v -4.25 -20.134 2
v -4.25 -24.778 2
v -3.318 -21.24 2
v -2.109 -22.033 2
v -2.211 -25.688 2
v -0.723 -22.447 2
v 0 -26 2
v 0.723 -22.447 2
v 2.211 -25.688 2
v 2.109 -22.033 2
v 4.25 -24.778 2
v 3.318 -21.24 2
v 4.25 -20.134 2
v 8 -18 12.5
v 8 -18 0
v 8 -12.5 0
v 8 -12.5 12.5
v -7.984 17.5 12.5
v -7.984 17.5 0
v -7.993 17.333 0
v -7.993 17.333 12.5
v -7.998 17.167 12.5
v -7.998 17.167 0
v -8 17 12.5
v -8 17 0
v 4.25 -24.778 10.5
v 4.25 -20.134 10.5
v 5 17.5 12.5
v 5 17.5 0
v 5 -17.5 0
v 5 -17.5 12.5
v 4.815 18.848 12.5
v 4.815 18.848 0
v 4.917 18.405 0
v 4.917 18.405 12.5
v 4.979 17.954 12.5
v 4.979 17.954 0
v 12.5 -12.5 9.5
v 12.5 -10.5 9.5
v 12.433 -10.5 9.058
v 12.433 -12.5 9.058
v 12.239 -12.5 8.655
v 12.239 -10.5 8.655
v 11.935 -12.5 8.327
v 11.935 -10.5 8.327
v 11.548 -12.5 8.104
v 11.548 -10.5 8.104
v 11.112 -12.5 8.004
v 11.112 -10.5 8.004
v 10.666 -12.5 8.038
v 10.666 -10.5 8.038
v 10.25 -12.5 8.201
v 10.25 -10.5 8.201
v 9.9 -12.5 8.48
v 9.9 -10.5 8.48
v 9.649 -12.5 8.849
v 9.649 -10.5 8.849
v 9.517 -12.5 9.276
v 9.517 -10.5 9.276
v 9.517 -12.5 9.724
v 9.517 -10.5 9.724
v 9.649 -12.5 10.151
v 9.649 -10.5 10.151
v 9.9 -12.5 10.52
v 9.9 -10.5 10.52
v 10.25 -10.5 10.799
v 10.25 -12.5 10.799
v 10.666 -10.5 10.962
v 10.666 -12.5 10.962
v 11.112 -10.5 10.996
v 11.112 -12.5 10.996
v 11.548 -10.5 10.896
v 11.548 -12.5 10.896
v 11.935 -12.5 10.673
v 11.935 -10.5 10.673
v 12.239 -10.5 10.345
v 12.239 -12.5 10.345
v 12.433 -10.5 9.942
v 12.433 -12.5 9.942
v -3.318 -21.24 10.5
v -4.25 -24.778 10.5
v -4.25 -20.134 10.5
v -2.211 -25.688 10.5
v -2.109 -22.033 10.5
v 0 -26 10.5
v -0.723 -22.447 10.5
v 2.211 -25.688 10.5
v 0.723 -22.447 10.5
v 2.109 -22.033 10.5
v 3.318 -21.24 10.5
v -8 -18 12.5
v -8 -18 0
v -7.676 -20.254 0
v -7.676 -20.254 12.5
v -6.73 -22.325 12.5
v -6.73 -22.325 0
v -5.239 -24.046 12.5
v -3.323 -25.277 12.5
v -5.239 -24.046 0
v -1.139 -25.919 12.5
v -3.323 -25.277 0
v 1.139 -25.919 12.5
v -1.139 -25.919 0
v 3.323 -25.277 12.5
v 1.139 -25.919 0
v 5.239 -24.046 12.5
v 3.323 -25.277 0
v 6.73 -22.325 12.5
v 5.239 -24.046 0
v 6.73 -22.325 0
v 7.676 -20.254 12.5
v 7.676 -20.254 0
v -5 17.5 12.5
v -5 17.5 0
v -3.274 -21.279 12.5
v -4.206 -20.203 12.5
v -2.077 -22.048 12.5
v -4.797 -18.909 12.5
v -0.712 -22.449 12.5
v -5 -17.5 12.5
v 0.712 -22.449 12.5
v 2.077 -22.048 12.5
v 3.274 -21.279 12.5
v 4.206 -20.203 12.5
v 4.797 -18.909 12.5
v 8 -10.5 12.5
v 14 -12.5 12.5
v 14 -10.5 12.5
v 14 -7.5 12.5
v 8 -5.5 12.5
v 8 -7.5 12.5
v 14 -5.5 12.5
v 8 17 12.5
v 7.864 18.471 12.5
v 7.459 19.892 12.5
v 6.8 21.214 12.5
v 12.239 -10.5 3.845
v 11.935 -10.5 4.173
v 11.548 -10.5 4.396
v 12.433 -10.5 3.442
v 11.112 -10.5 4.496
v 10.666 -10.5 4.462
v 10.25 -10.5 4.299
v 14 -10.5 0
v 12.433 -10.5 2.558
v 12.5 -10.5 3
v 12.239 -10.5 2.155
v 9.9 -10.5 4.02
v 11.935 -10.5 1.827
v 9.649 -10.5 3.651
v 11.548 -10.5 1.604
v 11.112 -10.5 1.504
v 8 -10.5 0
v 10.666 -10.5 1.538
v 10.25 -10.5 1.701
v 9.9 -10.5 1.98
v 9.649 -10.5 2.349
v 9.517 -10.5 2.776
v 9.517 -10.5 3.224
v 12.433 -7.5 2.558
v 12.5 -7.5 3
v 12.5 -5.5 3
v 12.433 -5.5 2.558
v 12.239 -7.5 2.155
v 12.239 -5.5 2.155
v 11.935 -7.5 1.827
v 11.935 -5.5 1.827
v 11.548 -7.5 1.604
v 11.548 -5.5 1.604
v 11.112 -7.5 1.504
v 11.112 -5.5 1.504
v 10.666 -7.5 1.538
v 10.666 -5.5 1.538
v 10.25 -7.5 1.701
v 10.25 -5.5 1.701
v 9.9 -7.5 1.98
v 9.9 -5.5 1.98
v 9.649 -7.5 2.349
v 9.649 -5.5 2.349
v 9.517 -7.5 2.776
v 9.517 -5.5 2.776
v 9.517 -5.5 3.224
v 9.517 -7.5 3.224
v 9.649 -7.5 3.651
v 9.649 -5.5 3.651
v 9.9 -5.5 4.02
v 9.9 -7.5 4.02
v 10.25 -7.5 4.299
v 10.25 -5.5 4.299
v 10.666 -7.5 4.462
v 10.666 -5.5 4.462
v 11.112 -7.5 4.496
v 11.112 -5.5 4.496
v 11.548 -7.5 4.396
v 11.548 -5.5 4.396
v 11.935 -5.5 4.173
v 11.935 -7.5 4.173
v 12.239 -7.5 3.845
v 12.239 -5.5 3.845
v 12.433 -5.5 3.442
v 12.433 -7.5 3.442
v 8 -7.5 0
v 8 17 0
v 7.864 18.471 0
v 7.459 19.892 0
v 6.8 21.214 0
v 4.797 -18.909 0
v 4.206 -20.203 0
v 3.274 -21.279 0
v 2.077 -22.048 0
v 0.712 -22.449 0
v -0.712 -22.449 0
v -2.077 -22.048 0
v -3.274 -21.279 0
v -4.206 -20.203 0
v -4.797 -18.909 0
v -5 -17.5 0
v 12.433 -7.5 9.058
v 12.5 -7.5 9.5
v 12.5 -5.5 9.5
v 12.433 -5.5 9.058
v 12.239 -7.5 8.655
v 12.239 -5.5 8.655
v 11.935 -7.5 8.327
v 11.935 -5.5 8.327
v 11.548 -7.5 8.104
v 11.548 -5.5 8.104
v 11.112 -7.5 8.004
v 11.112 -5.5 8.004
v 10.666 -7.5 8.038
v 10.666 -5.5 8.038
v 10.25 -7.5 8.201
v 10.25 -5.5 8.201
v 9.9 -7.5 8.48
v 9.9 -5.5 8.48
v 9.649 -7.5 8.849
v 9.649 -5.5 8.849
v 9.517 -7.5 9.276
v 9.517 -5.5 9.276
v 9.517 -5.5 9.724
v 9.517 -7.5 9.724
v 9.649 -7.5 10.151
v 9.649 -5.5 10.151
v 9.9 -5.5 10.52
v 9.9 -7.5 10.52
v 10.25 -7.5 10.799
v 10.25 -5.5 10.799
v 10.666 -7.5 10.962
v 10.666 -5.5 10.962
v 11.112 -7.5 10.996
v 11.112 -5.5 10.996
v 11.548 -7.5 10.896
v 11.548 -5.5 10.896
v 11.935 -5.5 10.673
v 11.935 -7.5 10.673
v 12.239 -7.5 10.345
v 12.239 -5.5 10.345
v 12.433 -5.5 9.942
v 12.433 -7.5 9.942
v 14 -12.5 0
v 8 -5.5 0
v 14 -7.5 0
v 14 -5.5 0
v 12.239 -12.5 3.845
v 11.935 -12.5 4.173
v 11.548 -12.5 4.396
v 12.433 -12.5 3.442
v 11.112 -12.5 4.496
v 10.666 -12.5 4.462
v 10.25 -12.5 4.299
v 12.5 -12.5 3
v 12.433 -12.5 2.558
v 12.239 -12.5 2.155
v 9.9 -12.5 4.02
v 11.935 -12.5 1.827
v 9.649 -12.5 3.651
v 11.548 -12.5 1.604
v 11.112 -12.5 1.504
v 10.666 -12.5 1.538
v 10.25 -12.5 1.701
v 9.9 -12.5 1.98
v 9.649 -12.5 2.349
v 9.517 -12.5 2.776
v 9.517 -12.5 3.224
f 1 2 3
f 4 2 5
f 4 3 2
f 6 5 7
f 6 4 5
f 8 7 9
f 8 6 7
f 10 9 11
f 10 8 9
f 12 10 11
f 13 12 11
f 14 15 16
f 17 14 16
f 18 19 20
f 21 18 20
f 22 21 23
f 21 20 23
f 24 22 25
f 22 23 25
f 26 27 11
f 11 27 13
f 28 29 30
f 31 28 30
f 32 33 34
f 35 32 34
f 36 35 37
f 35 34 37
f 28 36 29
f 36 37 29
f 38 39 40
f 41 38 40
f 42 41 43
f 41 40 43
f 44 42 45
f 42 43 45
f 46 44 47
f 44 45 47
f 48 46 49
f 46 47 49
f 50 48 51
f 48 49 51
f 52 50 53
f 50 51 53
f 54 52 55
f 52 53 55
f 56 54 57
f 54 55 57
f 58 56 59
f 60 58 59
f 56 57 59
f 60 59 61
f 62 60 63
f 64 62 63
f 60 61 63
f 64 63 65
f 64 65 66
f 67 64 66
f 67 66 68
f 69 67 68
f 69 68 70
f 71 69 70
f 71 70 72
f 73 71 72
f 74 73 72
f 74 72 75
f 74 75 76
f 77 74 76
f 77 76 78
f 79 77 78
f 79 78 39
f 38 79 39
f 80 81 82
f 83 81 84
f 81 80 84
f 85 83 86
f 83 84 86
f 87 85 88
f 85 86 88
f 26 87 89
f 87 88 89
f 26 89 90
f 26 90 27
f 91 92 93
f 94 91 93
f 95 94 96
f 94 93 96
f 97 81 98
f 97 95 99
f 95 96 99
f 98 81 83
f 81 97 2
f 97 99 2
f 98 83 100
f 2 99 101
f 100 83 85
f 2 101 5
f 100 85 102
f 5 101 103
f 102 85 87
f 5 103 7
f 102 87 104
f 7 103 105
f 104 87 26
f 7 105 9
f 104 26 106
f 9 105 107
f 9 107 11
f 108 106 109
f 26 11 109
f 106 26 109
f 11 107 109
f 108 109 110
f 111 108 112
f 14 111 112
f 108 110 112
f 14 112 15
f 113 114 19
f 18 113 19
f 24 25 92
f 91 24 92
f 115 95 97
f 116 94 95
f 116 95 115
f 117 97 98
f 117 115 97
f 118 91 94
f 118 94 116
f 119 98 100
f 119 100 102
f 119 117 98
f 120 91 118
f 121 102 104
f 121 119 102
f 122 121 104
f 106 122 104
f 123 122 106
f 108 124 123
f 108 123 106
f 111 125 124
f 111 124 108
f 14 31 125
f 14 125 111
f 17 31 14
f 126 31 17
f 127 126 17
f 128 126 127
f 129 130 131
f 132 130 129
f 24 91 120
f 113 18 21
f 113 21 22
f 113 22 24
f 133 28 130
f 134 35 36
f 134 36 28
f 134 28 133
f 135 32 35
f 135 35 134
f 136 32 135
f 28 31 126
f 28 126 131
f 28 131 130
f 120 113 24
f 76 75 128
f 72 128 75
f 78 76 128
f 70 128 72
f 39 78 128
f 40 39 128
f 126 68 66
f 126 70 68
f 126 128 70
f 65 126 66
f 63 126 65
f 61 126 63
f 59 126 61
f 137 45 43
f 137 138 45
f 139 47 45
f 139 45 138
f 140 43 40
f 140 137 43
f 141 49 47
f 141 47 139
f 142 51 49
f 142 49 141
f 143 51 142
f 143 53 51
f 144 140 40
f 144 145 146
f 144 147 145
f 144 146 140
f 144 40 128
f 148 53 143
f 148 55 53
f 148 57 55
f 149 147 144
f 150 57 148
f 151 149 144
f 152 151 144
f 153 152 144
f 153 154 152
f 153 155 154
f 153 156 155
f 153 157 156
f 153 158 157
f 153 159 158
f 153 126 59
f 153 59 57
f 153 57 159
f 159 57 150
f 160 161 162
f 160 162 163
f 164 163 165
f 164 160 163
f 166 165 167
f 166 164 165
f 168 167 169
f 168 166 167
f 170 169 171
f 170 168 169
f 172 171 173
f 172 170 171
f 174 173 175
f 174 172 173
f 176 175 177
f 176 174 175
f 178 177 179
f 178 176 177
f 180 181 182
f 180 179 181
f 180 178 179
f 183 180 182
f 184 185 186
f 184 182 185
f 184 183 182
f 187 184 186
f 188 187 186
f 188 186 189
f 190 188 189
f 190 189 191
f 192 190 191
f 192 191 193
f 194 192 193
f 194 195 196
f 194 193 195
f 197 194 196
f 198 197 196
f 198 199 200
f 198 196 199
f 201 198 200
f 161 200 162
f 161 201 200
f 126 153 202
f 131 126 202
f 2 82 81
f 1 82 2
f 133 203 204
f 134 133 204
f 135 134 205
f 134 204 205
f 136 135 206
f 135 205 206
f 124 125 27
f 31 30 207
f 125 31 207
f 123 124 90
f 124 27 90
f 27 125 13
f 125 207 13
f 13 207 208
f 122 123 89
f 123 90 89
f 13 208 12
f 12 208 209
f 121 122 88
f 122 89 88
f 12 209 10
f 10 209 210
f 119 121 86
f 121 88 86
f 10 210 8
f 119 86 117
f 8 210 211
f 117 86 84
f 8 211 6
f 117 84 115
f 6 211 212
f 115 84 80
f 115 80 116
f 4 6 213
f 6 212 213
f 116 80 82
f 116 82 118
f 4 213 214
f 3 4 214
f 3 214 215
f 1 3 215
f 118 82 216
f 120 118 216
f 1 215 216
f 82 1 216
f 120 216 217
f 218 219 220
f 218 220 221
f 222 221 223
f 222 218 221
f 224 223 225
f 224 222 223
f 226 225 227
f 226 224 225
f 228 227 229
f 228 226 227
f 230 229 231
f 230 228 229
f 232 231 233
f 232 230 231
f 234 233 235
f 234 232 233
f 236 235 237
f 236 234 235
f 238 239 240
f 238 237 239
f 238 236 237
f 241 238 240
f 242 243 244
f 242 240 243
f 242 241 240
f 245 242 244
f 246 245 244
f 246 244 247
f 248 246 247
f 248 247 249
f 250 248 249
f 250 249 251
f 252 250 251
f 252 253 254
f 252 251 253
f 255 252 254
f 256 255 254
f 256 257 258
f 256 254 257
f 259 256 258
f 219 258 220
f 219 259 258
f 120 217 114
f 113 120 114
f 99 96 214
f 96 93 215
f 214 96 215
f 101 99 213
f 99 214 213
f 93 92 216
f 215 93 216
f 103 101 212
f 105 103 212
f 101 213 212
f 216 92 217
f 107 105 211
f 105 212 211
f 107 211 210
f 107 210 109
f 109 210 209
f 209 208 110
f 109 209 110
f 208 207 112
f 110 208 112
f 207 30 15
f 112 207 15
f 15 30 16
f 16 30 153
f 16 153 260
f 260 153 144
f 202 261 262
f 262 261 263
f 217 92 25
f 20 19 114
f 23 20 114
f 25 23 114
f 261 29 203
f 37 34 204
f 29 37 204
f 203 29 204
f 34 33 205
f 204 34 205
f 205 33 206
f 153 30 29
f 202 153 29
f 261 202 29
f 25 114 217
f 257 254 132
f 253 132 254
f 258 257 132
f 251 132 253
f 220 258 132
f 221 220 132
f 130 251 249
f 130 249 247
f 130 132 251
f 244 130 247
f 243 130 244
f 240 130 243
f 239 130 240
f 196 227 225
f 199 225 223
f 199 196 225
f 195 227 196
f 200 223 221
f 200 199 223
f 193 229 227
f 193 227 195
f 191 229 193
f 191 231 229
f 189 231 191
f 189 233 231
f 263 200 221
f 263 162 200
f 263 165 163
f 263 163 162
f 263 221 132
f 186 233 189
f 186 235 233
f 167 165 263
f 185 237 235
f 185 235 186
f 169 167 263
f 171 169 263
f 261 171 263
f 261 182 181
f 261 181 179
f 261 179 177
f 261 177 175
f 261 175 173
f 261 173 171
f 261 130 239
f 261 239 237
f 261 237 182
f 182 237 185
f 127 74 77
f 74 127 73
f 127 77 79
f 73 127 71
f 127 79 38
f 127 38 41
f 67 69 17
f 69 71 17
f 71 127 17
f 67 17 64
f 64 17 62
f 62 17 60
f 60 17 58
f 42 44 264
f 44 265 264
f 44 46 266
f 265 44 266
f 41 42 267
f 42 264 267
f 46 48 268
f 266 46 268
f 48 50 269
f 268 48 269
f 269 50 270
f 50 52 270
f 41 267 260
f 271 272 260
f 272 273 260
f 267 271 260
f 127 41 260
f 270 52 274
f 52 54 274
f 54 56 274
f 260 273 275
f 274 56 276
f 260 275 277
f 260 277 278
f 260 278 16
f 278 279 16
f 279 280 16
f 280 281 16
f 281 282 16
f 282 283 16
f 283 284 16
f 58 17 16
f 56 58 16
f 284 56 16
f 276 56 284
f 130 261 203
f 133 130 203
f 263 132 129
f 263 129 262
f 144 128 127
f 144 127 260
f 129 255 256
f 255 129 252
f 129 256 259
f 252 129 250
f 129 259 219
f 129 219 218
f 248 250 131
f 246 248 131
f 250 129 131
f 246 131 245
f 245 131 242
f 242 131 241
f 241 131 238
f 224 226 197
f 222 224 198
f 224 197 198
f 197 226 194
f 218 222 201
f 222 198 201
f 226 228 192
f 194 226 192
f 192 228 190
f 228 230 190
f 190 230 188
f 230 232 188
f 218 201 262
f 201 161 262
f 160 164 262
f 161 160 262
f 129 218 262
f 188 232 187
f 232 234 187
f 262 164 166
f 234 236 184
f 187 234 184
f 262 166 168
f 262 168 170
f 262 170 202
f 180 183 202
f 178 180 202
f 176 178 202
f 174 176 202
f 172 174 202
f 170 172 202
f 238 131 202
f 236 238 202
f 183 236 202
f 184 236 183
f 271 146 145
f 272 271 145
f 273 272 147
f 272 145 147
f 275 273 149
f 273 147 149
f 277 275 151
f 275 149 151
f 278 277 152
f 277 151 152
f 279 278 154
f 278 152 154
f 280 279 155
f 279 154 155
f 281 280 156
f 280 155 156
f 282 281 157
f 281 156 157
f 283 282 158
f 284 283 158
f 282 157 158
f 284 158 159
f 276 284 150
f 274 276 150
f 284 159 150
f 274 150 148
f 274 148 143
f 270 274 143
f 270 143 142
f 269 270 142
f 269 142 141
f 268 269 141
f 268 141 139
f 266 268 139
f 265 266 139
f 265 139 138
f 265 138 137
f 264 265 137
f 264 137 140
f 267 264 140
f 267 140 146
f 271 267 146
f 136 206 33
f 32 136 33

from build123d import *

# Parameters (mm, degrees)
BOSS_EXTRUDE1_DEPTH     = 12.5
SKETCH2_W               = 12.5
SKETCH2_H               = 2
BOSS_EXTRUDE2_DEPTH     = 6
SKETCH3_R               = 1.5
CUT_EXTRUDE1_DEPTH      = 32.713927878
CUT_EXTRUDE1_DEPTH_BACK = 16.499999831
SKETCH5_W               = 8.5
SKETCH5_H               = 8.5
CUT_EXTRUDE2_DEPTH      = 26.999999831


with BuildPart() as part:
    # Sketch1 → Boss-Extrude1 (new body)
    with BuildSketch(Plane.XY):
        with BuildLine():
            ThreePointArc((8, 17), (7.694207367, 19.190701486), (6.80020675, 21.213927878))
            Line((6.80020675, 21.213927878), (4.814885895, 18.847914617))
            ThreePointArc((4.814885895, 18.847914617), (4.953505298, 18.180283222), (5, 17.5))
            Line((5, 17.5), (5, -17.5))
            ThreePointArc((5, -17.5), (0, -22.5), (-5, -17.5))
            Line((-5, -17.5), (-5, 17.5))
            Line((-5, 17.5), (-7.984359711, 17.5))
            ThreePointArc((-7.984359711, 17.5), (-7.996088972, 17.250122279), (-8, 17))
            Line((-8, 17), (-8, -17.999999662))
            ThreePointArc((-8, -17.999999662), (-1.69e-07, -25.999999831), (8, -18))
            Line((8, -18), (8, 17))
        make_face()
    extrude(amount=BOSS_EXTRUDE1_DEPTH)

    # Sketch2 → Boss-Extrude2 (add)
    with BuildSketch(Plane(origin=(8, 0, 0), x_dir=(0, 0, -1), z_dir=(1, 0, 0))):
        with Locations((-6.25, -11.5)):
            Rectangle(SKETCH2_W, SKETCH2_H)
        with Locations((-6.25, -6.5)):
            Rectangle(SKETCH2_W, SKETCH2_H)
    extrude(amount=BOSS_EXTRUDE2_DEPTH)

    # Sketch3 → Cut-Extrude1 (cut, two sides)
    with BuildSketch(Plane(origin=(0, -10.5, 0), x_dir=(1, 0, 0), z_dir=(0, 1, 0))) as cut_extrude1_sk:
        with Locations((11, -3)):
            Circle(SKETCH3_R)
        with Locations((11, -9.5)):
            Circle(SKETCH3_R)
    extrude(amount=CUT_EXTRUDE1_DEPTH, mode=Mode.SUBTRACT)
    extrude(cut_extrude1_sk.sketch, amount=-CUT_EXTRUDE1_DEPTH_BACK, mode=Mode.SUBTRACT)

    # Sketch5 → Cut-Extrude2 (cut, through all)
    with BuildSketch(Plane(origin=(0, 0, 0), x_dir=(1, 0, 0), z_dir=(0, 1, 0))):
        with Locations((0, -6.25)):
            Rectangle(SKETCH5_W, SKETCH5_H)
    extrude(amount=-CUT_EXTRUDE2_DEPTH, mode=Mode.SUBTRACT)


solid = part.part
